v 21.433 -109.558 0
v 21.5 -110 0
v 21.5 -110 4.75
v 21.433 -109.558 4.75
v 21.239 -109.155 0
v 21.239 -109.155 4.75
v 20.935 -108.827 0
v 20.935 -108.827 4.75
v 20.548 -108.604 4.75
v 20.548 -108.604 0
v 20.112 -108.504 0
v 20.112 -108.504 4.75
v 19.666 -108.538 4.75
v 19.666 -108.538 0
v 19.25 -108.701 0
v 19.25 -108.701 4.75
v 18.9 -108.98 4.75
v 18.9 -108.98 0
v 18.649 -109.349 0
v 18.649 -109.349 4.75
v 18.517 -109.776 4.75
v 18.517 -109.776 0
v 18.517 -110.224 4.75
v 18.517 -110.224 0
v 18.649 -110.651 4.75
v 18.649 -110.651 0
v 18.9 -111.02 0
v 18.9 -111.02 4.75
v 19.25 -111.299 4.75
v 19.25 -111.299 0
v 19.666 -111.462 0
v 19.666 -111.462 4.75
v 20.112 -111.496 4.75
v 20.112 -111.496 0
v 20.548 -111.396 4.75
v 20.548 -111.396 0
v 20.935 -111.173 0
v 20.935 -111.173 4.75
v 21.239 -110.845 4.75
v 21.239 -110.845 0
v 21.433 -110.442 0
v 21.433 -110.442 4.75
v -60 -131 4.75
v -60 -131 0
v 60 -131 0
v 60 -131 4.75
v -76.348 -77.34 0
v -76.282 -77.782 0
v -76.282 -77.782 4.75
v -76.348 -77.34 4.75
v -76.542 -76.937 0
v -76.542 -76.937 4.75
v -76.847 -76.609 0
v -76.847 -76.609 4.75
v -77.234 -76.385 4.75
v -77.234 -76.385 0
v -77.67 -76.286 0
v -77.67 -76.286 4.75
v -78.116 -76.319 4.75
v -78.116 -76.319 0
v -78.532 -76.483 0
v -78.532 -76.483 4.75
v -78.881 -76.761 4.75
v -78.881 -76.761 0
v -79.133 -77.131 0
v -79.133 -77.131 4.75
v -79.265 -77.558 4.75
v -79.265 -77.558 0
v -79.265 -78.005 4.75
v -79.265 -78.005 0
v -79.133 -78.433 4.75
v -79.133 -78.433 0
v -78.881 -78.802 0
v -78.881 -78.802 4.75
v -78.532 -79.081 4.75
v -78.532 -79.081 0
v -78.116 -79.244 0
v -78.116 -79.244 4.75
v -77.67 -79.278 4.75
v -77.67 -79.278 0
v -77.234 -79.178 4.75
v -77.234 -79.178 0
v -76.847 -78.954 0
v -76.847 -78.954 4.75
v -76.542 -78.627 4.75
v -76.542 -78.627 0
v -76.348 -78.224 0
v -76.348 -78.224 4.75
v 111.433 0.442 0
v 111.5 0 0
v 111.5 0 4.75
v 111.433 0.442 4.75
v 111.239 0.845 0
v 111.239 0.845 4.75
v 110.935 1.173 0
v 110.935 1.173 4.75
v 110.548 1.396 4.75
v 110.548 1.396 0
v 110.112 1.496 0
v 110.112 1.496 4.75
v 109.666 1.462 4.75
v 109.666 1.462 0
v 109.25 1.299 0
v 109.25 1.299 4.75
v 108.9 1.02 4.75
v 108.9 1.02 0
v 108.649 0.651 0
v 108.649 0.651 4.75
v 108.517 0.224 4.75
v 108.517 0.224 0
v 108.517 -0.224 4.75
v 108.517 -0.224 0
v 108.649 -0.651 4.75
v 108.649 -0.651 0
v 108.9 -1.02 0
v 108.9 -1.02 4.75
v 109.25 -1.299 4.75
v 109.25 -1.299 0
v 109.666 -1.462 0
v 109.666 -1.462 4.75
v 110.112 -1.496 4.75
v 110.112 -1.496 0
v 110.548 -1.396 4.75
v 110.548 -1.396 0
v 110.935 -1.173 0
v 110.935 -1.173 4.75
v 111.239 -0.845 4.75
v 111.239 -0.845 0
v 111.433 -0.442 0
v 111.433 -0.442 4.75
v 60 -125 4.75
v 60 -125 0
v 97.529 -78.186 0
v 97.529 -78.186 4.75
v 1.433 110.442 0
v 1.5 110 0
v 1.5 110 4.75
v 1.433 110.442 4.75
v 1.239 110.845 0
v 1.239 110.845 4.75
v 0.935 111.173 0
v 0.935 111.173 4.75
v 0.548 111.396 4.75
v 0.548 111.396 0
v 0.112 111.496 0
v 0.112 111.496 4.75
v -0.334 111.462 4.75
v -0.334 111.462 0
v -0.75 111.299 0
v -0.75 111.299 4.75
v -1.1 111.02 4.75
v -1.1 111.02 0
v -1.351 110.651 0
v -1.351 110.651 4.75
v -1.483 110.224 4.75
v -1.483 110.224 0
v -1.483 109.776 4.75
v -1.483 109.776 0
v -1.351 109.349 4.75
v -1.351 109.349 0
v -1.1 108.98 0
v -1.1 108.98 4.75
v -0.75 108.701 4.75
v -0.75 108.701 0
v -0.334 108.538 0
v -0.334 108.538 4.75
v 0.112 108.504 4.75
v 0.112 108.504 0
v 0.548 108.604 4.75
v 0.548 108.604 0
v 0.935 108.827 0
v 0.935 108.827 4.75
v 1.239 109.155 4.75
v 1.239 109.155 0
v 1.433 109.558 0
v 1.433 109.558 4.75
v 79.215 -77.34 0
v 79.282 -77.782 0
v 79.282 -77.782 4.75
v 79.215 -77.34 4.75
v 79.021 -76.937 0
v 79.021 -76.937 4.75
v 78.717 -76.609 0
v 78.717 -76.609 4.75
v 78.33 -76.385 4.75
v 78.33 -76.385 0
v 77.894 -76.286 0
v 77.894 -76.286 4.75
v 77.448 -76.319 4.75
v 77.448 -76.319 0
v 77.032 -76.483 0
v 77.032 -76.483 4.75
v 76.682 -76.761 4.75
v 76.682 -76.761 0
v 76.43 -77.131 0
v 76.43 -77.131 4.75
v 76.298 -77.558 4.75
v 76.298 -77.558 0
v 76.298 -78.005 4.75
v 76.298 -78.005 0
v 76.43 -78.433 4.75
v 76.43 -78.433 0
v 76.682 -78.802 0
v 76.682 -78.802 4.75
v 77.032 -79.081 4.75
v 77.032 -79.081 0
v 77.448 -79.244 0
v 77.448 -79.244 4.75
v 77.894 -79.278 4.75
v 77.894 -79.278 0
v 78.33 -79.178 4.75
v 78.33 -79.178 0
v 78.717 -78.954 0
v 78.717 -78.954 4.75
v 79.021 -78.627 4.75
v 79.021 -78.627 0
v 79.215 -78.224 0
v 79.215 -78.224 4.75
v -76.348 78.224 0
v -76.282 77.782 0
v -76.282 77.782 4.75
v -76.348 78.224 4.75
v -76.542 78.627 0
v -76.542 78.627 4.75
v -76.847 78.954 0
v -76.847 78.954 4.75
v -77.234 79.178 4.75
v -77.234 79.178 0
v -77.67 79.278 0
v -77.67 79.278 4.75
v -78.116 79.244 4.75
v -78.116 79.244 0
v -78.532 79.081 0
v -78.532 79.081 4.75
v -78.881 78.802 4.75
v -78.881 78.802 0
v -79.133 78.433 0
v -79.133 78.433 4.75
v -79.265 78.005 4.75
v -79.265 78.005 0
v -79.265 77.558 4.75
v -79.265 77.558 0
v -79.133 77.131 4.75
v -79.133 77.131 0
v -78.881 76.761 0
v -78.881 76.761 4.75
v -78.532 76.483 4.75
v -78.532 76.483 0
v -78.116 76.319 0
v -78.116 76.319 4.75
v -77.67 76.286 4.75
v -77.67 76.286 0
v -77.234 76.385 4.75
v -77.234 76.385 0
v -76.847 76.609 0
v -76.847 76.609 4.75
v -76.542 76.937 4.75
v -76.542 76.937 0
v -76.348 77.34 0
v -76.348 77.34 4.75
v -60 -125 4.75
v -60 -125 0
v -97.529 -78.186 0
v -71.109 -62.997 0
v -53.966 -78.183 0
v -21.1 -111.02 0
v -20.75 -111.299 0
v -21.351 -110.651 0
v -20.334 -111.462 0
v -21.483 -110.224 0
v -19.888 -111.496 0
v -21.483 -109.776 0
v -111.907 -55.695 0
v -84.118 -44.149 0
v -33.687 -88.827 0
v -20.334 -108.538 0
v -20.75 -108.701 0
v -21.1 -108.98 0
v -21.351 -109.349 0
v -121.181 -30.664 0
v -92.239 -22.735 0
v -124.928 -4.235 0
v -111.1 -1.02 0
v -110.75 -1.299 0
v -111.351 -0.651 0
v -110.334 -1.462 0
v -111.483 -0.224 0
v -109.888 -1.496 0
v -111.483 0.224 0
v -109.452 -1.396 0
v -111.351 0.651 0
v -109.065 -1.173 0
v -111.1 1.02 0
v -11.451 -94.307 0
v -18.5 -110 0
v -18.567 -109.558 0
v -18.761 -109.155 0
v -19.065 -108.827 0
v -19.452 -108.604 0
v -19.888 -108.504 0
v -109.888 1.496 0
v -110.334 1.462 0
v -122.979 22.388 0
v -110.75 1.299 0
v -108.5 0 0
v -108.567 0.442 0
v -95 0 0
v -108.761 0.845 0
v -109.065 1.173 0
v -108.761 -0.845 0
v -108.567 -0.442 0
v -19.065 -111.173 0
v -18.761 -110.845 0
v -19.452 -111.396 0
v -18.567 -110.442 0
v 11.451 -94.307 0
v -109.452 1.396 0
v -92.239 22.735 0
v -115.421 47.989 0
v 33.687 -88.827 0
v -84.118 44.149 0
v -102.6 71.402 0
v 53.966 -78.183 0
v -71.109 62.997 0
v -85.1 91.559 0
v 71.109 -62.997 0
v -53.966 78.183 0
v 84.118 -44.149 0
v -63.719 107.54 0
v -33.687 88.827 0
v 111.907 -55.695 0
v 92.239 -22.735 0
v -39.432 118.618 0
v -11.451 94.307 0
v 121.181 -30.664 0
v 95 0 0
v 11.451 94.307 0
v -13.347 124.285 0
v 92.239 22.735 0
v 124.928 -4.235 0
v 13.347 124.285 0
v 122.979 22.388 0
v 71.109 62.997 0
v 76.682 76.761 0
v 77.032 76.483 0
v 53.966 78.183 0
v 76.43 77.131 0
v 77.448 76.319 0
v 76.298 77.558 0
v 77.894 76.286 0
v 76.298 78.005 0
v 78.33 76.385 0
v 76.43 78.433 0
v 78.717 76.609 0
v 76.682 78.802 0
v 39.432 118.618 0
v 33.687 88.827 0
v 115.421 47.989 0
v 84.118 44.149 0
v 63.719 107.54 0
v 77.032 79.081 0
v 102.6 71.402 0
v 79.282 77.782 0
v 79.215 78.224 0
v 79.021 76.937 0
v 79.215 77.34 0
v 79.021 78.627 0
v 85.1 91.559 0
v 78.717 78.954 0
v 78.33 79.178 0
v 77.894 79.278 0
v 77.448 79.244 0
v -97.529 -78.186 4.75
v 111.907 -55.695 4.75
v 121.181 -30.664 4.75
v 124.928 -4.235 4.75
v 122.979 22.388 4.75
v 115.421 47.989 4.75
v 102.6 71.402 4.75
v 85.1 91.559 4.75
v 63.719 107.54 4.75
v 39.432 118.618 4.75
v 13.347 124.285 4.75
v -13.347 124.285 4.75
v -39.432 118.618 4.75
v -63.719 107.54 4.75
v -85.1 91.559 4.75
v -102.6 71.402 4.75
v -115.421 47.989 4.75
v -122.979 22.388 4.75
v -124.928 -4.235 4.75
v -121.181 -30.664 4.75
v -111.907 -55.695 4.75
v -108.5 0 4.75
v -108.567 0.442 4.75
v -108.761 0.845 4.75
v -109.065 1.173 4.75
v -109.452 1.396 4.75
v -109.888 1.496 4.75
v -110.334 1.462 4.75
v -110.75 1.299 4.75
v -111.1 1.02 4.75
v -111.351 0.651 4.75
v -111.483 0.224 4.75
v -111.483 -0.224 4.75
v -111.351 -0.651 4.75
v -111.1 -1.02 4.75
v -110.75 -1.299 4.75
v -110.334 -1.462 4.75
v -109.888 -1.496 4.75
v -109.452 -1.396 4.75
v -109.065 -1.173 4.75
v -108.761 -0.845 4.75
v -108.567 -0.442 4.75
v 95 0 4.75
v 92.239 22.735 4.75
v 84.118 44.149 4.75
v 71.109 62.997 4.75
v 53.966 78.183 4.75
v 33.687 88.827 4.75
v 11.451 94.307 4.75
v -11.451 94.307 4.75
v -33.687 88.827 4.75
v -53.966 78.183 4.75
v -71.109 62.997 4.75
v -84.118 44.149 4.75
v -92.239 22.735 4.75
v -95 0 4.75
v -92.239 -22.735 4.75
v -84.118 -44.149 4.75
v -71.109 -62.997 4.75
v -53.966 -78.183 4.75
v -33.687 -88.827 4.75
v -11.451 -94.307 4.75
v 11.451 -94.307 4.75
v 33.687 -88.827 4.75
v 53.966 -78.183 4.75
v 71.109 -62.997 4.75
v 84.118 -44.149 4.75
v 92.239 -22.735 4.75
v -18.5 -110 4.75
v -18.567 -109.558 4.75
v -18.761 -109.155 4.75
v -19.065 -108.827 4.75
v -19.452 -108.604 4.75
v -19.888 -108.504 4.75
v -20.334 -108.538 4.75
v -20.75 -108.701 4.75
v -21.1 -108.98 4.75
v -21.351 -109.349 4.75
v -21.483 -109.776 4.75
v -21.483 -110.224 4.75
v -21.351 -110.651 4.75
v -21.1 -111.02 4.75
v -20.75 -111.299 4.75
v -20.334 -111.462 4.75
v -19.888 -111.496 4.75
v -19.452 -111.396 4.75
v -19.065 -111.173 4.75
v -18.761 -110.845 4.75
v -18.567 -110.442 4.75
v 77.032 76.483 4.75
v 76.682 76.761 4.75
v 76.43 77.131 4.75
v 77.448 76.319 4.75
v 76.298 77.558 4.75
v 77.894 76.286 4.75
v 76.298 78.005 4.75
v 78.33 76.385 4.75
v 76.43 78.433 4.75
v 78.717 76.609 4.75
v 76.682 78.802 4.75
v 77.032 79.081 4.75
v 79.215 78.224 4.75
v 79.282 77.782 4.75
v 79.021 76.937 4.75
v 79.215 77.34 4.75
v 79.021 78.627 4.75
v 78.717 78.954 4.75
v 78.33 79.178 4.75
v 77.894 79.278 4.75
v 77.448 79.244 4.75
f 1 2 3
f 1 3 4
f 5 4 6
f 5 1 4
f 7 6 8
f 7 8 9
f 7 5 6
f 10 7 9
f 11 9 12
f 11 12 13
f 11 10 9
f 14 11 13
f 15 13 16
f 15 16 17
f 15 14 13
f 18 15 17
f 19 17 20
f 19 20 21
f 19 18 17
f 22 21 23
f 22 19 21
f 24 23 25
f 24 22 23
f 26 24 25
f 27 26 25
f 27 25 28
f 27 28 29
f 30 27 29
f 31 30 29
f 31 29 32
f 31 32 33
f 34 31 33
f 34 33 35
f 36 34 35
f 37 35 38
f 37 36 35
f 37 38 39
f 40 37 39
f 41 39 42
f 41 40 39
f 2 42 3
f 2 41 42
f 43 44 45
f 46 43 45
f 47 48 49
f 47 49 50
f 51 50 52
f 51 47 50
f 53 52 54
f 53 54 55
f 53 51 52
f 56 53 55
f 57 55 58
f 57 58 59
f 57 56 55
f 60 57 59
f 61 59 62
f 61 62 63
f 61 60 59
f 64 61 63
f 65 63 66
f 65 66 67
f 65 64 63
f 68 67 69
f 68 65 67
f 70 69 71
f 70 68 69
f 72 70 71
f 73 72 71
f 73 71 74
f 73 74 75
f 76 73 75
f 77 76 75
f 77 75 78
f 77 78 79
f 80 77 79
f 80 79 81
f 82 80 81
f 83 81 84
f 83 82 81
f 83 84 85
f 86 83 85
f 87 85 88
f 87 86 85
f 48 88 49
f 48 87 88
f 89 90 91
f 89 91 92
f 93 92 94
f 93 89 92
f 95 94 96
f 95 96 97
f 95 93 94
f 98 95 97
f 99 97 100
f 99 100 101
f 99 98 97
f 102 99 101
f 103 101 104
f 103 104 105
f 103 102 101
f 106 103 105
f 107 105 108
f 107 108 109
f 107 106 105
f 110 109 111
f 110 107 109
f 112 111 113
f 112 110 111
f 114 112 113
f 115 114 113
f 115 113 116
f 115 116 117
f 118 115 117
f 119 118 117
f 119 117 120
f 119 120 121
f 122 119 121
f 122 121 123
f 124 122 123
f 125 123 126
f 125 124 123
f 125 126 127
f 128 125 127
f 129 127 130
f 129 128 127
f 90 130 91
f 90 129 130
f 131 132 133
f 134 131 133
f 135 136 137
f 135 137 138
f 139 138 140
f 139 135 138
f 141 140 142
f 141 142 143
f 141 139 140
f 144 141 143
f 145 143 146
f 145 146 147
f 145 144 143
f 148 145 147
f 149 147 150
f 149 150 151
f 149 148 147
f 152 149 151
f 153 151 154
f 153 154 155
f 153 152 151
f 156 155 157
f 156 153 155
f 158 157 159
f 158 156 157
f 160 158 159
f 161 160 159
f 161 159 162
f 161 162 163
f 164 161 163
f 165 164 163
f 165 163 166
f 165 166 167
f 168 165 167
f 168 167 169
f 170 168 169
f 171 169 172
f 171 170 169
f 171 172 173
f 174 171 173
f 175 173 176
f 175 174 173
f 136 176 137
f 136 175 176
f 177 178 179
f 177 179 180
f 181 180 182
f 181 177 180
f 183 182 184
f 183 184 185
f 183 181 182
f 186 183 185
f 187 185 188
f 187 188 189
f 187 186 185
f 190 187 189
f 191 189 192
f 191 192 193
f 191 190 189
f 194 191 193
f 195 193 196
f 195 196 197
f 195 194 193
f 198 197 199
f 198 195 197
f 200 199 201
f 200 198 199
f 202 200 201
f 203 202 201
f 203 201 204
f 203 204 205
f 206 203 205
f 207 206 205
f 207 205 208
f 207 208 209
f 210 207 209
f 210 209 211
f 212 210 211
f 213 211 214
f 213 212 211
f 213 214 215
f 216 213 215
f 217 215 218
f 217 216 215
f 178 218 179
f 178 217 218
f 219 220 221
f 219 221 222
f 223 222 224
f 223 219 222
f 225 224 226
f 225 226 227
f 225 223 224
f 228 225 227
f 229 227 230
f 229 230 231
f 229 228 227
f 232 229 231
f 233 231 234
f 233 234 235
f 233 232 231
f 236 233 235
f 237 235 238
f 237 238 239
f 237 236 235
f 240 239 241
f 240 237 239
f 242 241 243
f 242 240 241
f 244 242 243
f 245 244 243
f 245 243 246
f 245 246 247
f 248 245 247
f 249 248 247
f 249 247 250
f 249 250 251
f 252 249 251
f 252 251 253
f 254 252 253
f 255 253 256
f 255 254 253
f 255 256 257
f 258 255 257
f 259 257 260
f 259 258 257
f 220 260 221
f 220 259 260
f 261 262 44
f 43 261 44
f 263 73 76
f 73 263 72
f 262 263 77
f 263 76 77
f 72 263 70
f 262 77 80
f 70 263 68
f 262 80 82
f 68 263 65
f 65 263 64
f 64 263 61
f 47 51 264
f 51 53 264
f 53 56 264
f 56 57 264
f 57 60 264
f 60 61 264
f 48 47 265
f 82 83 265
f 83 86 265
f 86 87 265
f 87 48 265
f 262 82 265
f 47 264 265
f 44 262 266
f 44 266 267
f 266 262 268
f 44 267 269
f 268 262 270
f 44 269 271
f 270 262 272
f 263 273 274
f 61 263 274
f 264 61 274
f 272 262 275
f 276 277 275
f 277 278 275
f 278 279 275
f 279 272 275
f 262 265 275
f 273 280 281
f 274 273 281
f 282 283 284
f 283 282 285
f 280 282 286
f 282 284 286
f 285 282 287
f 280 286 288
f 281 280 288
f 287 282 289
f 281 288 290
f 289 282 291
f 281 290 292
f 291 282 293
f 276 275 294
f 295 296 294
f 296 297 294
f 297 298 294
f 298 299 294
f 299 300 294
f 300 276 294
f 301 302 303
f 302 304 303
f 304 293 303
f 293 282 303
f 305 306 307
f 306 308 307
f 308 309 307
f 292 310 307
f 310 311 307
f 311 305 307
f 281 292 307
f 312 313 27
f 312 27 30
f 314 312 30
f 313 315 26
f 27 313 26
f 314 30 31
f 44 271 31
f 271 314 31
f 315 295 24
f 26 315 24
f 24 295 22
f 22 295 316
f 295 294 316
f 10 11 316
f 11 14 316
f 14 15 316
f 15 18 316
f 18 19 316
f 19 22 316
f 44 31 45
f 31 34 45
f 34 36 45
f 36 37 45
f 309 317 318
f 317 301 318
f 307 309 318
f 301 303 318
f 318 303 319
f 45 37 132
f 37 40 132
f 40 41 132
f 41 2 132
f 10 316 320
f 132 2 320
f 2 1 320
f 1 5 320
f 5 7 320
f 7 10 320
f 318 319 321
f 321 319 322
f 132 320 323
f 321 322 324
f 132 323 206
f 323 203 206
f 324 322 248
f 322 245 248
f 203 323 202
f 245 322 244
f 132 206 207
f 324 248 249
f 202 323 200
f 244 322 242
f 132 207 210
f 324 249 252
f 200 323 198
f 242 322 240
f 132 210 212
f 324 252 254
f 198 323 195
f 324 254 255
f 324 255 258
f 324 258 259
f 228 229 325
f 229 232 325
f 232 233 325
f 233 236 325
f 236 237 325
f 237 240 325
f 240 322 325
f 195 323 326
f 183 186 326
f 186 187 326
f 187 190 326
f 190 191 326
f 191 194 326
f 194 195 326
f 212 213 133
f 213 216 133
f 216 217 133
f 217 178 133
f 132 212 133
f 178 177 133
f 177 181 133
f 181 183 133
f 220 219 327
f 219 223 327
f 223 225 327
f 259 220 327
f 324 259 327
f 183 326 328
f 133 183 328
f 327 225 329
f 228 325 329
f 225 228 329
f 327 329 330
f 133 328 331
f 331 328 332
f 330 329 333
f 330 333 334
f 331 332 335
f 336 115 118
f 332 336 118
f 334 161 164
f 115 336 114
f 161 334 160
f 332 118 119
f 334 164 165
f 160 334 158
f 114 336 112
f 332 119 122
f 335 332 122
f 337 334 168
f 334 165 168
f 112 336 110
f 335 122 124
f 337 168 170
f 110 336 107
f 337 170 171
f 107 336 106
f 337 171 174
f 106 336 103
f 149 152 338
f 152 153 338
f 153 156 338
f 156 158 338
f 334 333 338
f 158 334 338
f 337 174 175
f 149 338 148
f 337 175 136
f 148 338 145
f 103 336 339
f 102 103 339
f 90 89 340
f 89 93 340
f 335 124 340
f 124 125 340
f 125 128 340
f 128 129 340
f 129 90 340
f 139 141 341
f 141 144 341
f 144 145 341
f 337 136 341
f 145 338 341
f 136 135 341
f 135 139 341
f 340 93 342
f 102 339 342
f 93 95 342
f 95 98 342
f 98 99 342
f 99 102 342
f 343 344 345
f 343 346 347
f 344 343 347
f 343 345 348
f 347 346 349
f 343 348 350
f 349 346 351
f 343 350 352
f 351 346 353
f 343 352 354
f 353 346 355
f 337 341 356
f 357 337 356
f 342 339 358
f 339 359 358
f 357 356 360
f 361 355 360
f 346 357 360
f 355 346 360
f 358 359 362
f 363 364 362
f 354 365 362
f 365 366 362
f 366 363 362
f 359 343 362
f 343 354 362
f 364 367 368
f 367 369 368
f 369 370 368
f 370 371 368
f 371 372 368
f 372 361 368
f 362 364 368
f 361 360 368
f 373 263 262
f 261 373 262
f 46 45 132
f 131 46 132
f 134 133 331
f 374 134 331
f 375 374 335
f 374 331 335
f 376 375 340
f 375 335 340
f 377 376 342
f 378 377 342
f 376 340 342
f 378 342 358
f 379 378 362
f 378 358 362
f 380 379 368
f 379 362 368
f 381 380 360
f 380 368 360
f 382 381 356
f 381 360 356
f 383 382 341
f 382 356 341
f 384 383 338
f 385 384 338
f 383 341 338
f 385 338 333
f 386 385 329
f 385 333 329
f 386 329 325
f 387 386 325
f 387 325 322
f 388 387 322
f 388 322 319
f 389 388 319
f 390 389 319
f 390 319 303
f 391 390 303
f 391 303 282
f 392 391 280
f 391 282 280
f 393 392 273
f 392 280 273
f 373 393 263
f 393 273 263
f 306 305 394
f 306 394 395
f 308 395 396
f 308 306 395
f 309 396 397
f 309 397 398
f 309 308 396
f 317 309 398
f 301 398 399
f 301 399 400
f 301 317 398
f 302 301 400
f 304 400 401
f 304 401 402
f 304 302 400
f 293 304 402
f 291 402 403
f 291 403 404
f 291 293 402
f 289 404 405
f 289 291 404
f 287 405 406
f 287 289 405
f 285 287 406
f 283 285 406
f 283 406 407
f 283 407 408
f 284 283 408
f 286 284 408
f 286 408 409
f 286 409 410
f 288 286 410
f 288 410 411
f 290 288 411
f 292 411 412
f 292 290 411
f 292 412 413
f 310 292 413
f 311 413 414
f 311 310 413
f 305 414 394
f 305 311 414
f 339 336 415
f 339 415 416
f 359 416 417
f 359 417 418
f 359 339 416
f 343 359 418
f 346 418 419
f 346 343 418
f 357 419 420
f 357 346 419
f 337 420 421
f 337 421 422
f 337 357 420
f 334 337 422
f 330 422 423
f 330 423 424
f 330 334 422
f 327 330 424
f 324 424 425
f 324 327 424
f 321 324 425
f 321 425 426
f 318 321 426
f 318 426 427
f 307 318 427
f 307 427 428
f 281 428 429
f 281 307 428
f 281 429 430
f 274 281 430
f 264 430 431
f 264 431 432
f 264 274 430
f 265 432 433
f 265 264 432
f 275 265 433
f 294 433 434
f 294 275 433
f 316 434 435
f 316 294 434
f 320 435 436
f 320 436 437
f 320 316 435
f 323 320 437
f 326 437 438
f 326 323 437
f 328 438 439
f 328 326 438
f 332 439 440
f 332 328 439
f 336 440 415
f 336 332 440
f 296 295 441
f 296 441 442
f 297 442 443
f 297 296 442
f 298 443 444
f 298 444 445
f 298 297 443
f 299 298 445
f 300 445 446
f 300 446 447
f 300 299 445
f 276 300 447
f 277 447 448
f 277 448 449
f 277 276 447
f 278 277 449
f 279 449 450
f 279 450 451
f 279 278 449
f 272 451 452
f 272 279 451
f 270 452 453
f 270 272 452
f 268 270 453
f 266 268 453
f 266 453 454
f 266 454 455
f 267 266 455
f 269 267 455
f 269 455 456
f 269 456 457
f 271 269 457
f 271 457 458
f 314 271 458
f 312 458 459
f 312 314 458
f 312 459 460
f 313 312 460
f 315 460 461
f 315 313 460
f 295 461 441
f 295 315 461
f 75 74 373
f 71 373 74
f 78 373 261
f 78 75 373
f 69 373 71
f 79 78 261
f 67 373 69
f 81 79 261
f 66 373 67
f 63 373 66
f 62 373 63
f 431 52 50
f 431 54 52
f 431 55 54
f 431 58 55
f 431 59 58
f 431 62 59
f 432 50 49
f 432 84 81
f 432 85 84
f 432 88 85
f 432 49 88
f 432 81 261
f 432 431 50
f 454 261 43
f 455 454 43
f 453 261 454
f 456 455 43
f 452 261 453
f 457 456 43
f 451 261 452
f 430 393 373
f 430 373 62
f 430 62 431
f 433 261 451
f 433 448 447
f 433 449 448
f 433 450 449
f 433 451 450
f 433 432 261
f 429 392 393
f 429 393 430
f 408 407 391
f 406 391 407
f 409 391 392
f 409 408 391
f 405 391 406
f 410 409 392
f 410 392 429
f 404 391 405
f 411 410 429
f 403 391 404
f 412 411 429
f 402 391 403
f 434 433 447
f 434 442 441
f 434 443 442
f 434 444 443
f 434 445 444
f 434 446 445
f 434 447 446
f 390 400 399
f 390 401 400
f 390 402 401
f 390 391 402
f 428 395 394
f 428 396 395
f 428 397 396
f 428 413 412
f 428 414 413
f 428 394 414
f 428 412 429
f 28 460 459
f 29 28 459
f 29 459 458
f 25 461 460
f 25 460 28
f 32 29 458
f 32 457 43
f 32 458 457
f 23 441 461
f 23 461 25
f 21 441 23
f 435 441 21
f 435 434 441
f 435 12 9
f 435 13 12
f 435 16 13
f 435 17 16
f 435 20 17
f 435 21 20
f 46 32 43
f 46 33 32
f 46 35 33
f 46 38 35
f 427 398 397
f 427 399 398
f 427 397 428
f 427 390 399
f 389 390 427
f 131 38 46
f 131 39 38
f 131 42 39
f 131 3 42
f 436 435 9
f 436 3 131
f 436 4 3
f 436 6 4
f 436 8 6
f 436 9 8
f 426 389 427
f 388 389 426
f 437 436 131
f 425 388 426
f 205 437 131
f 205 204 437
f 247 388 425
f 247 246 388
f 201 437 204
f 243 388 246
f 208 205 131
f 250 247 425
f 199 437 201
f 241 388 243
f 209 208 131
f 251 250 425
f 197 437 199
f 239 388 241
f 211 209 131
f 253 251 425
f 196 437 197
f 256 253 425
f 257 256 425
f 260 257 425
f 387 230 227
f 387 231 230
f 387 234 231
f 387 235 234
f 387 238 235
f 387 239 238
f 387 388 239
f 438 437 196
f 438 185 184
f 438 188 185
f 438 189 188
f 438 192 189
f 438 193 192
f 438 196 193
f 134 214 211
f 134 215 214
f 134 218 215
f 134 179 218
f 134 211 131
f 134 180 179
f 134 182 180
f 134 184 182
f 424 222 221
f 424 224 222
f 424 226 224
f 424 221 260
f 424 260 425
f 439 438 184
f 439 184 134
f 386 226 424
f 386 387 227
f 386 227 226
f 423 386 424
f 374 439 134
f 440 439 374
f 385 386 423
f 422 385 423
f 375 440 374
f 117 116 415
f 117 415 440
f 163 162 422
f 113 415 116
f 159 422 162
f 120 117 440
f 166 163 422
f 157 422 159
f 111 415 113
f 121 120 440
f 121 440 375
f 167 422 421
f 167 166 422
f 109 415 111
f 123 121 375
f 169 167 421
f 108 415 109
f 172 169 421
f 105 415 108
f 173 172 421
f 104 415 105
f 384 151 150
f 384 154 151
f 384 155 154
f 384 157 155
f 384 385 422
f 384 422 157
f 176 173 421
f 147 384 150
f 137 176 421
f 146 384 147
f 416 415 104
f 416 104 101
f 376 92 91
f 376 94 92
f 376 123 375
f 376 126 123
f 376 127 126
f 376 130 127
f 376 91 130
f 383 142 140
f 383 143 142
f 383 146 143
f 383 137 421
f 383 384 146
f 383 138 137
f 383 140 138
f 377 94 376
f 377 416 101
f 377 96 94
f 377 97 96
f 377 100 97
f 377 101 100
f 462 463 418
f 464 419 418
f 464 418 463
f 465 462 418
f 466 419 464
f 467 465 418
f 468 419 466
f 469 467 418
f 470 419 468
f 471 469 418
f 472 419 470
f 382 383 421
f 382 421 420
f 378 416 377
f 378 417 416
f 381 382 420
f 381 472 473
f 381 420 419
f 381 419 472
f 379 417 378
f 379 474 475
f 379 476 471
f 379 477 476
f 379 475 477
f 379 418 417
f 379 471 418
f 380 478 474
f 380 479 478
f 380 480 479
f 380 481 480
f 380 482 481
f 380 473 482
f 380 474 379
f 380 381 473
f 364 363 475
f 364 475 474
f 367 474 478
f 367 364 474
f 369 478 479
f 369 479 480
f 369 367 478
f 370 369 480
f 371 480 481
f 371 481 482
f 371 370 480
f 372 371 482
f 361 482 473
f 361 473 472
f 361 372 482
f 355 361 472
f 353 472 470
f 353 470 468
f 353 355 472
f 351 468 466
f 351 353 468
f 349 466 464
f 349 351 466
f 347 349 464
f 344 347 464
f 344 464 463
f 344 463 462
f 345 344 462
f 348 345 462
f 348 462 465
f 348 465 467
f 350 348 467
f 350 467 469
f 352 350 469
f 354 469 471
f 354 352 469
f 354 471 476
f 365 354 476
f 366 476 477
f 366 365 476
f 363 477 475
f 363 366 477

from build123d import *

# Parameters (mm, degrees)
SKETCH1_R           = 1.5
SKETCH1_R_2         = 95
BOSS_EXTRUDE1_DEPTH = 4.75


with BuildPart() as part:
    # Sketch1 → Boss-Extrude1 (new body)
    with BuildSketch(Plane.XY):
        with BuildLine():
            Line((-97.529258778, -78.185955787), (-60, -125))
            Line((-60, -125), (-60, -131))
            Line((-60, -131), (60, -131))
            Line((60, -131), (60, -125))
            Line((60, -125), (97.529258778, -78.185955787))
            ThreePointArc((97.529258778, -78.185955787), (0, 125), (-97.529258778, -78.185955787))
        make_face()
        with Locations((-77.781745931, -77.781745931)):
            Circle(SKETCH1_R, mode=Mode.SUBTRACT)
        with Locations((-20, -110)):
            Circle(SKETCH1_R, mode=Mode.SUBTRACT)
        with Locations((20, -110)):
            Circle(SKETCH1_R, mode=Mode.SUBTRACT)
        with Locations((77.781745931, -77.781745931)):
            Circle(SKETCH1_R, mode=Mode.SUBTRACT)
        with Locations((-110, 0)):
            Circle(SKETCH1_R, mode=Mode.SUBTRACT)
        with Locations((-77.781745931, 77.781745931)):
            Circle(SKETCH1_R, mode=Mode.SUBTRACT)
        Circle(SKETCH1_R_2, mode=Mode.SUBTRACT)
        with Locations((110, 0)):
            Circle(SKETCH1_R, mode=Mode.SUBTRACT)
        with Locations((0, 110)):
            Circle(SKETCH1_R, mode=Mode.SUBTRACT)
        with Locations((77.781745931, 77.781745931)):
            Circle(SKETCH1_R, mode=Mode.SUBTRACT)
    extrude(amount=BOSS_EXTRUDE1_DEPTH)


solid = part.part
